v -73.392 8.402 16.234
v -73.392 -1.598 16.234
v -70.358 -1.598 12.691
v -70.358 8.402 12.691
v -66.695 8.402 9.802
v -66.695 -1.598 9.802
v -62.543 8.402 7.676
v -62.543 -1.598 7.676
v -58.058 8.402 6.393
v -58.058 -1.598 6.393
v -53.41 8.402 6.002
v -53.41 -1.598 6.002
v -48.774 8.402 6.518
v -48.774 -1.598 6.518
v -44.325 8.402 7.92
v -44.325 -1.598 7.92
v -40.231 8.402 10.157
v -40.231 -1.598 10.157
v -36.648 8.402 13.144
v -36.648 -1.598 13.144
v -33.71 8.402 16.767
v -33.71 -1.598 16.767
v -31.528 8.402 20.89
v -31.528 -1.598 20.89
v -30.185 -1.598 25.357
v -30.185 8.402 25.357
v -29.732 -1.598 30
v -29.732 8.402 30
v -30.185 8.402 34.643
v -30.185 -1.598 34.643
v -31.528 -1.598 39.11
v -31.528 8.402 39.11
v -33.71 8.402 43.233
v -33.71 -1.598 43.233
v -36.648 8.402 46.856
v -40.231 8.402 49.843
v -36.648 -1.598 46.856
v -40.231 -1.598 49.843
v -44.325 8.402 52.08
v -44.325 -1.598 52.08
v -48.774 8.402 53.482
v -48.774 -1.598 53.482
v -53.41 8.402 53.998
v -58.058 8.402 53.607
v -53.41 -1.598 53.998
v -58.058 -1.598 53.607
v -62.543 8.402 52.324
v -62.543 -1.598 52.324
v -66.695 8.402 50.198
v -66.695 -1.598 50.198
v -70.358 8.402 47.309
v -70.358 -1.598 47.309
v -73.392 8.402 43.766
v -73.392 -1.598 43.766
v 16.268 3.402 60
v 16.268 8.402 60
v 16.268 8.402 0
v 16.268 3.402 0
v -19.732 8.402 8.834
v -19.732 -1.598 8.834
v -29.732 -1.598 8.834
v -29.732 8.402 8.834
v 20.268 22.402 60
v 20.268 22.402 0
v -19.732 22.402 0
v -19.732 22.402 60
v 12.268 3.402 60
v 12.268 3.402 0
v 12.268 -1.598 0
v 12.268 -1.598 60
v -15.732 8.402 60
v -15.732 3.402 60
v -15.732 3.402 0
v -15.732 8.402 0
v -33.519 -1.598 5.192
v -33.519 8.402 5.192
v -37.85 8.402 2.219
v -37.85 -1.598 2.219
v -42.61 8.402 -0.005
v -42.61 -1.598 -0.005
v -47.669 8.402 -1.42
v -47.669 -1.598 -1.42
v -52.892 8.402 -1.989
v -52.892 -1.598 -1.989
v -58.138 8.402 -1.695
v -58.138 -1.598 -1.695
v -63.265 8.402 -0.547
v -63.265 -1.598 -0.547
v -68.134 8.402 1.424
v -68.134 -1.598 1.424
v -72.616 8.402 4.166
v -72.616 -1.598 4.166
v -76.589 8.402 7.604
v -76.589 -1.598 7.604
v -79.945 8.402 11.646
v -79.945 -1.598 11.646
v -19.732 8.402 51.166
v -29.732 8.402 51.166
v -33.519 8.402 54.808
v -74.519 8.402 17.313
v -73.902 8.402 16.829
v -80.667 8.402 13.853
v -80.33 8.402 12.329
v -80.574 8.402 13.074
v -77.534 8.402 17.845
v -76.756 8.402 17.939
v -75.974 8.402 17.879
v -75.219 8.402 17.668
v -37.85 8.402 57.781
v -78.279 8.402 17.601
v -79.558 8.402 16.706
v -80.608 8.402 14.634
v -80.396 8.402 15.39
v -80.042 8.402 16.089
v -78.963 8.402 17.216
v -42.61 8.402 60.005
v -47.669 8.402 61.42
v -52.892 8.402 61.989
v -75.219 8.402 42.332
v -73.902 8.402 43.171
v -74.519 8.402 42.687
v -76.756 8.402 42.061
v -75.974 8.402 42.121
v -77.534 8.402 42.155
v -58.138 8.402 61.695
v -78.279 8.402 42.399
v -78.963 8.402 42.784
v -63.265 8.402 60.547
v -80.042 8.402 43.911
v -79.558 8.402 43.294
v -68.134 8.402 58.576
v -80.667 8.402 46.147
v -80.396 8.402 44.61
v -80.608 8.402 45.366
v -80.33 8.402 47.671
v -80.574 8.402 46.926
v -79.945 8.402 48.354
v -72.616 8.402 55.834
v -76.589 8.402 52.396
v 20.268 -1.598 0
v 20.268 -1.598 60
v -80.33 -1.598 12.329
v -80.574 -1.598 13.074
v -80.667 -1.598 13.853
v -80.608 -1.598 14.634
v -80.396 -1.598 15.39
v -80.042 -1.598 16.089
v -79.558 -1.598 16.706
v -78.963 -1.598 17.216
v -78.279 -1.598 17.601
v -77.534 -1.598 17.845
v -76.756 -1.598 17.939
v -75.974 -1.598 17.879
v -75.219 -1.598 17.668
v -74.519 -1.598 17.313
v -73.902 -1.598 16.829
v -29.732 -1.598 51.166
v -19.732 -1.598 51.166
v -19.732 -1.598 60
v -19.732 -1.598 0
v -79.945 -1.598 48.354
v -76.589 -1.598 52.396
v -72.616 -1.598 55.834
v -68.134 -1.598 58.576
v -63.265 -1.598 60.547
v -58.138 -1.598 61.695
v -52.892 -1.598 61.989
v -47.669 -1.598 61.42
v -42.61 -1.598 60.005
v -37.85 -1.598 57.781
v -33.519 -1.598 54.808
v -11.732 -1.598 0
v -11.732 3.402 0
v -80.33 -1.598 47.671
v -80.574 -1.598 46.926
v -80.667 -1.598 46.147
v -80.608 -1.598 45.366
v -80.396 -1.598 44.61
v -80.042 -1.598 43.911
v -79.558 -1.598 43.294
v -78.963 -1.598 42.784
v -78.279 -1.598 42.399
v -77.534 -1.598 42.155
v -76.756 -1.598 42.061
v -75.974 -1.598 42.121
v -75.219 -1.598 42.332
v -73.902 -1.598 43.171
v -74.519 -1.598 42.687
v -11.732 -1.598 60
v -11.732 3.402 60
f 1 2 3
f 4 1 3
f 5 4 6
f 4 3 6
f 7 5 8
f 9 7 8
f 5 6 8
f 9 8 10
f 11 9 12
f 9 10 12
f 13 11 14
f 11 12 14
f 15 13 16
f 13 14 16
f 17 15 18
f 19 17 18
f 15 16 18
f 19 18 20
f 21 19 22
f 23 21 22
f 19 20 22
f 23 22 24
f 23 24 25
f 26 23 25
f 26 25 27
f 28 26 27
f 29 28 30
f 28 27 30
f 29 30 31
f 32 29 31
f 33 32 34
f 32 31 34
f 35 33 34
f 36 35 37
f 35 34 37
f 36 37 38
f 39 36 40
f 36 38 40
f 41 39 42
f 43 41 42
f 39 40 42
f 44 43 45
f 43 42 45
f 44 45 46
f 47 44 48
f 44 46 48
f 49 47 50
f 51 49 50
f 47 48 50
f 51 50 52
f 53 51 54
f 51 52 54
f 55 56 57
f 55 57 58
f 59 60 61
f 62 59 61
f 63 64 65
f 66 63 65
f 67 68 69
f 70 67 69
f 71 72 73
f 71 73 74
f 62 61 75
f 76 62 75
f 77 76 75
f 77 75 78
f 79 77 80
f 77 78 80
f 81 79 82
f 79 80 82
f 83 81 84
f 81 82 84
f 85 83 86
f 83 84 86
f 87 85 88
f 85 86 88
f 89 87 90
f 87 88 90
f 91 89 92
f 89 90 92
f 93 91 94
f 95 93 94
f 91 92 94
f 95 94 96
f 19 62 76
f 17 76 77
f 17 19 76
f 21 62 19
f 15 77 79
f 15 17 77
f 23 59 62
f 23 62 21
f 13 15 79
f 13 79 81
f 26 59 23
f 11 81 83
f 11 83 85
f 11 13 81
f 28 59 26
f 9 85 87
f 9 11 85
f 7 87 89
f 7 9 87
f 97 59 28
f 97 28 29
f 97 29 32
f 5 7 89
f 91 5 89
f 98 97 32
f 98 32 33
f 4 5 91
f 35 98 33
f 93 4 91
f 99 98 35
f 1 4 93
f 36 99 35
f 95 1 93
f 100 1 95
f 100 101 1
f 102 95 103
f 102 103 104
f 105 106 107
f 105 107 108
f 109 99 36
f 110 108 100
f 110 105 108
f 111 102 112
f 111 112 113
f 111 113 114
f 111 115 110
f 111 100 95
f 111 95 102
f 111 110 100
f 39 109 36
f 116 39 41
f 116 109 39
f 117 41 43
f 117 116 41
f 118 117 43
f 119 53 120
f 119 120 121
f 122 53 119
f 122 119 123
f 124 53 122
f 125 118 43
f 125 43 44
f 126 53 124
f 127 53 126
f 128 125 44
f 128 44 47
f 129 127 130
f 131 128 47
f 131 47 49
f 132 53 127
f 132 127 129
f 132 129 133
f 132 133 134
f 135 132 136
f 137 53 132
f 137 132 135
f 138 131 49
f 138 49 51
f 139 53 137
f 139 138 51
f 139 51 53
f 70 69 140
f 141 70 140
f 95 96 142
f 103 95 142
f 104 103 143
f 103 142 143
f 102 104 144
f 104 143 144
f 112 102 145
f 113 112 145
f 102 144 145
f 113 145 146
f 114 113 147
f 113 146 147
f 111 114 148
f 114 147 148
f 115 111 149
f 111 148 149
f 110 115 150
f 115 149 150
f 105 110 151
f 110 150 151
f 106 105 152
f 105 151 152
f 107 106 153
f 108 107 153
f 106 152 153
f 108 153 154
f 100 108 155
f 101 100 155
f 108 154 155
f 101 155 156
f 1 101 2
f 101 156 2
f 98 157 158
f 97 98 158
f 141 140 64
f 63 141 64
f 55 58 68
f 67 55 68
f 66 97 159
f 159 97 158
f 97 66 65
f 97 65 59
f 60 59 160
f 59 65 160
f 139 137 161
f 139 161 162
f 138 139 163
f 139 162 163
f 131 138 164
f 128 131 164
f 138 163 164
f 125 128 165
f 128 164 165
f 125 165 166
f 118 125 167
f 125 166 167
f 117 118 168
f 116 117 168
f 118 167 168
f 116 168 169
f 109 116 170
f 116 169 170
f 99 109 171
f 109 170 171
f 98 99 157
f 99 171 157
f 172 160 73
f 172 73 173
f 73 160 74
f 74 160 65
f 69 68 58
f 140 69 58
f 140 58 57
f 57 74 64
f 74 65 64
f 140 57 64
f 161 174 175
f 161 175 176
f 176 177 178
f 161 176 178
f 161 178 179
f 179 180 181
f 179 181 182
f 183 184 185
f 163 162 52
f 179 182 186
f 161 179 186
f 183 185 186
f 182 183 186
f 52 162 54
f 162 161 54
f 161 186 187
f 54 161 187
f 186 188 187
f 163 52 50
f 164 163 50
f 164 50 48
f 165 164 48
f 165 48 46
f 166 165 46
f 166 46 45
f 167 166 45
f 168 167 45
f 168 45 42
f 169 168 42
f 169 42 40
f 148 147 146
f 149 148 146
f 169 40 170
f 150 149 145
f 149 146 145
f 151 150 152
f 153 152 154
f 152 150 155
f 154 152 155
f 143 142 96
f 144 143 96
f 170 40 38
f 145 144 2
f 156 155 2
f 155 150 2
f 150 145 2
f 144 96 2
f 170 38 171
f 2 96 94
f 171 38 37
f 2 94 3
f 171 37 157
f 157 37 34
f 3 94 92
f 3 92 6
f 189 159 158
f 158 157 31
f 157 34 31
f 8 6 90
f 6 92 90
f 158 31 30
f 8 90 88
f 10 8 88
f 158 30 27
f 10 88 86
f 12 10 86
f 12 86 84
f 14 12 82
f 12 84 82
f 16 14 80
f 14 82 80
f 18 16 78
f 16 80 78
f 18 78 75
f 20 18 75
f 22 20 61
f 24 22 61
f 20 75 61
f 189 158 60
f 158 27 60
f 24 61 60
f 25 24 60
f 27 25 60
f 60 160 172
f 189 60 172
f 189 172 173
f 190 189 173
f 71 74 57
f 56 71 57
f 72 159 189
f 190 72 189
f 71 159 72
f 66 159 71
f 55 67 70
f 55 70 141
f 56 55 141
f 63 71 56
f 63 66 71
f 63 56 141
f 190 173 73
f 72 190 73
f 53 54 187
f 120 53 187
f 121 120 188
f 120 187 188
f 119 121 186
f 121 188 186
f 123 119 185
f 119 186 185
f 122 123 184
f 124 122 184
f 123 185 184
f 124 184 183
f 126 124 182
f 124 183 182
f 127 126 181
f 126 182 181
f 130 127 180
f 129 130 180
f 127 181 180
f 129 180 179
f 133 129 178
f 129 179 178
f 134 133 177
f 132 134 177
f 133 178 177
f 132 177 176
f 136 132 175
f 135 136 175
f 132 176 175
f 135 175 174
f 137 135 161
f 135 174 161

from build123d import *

# Parameters (mm, degrees)
EXTRUDE_1_DEPTH = 60
EXTRUDE_2_DEPTH = 10


with BuildPart() as part:
    # 草图1 → 凸台-拉伸1 (new body)
    with BuildSketch(Plane.XY):
        Polygon((-19.732146976, -1.598220465), (-11.732146976, -1.598220465), (-11.732146976, 3.401779535), (-15.732146976, 3.401779535), (-15.732146976, 8.401779535), (16.267853024, 8.401779535), (16.267853024, 3.401779535), (12.267853024, 3.401779535), (12.267853024, -1.598220465), (20.267853024, -1.598220465), (20.267853024, 22.401779535), (-19.732146976, 22.401779535), align=None)
    extrude(amount=EXTRUDE_1_DEPTH)

    # 草图2 → 凸台-拉伸2 (add)
    with BuildSketch(Plane.XZ.offset(1.598220465)):
        with BuildLine():
            Line((-29.732146976, 51.166010489), (-19.732146976, 51.166010489))
            Line((-19.732146976, 51.166010489), (-19.732146976, 8.833989511))
            Line((-19.732146976, 8.833989511), (-29.732146976, 8.833989511))
            ThreePointArc((-29.732146976, 8.833989511), (-55.52111794, -1.949954349), (-79.945012394, 11.645554037))
            ThreePointArc((-79.945012394, 11.645554037), (-78.962709962, 17.216467959), (-73.391796039, 16.234165528))
            ThreePointArc((-73.391796039, 16.234165528), (-29.732146976, 30), (-73.391796039, 43.765834472))
            ThreePointArc((-73.391796039, 43.765834472), (-78.962709962, 42.783532041), (-79.945012394, 48.354445963))
            ThreePointArc((-79.945012394, 48.354445963), (-55.52111794, 61.949954349), (-29.732146976, 51.166010489))
        make_face()
    extrude(amount=-EXTRUDE_2_DEPTH)


solid = part.part
